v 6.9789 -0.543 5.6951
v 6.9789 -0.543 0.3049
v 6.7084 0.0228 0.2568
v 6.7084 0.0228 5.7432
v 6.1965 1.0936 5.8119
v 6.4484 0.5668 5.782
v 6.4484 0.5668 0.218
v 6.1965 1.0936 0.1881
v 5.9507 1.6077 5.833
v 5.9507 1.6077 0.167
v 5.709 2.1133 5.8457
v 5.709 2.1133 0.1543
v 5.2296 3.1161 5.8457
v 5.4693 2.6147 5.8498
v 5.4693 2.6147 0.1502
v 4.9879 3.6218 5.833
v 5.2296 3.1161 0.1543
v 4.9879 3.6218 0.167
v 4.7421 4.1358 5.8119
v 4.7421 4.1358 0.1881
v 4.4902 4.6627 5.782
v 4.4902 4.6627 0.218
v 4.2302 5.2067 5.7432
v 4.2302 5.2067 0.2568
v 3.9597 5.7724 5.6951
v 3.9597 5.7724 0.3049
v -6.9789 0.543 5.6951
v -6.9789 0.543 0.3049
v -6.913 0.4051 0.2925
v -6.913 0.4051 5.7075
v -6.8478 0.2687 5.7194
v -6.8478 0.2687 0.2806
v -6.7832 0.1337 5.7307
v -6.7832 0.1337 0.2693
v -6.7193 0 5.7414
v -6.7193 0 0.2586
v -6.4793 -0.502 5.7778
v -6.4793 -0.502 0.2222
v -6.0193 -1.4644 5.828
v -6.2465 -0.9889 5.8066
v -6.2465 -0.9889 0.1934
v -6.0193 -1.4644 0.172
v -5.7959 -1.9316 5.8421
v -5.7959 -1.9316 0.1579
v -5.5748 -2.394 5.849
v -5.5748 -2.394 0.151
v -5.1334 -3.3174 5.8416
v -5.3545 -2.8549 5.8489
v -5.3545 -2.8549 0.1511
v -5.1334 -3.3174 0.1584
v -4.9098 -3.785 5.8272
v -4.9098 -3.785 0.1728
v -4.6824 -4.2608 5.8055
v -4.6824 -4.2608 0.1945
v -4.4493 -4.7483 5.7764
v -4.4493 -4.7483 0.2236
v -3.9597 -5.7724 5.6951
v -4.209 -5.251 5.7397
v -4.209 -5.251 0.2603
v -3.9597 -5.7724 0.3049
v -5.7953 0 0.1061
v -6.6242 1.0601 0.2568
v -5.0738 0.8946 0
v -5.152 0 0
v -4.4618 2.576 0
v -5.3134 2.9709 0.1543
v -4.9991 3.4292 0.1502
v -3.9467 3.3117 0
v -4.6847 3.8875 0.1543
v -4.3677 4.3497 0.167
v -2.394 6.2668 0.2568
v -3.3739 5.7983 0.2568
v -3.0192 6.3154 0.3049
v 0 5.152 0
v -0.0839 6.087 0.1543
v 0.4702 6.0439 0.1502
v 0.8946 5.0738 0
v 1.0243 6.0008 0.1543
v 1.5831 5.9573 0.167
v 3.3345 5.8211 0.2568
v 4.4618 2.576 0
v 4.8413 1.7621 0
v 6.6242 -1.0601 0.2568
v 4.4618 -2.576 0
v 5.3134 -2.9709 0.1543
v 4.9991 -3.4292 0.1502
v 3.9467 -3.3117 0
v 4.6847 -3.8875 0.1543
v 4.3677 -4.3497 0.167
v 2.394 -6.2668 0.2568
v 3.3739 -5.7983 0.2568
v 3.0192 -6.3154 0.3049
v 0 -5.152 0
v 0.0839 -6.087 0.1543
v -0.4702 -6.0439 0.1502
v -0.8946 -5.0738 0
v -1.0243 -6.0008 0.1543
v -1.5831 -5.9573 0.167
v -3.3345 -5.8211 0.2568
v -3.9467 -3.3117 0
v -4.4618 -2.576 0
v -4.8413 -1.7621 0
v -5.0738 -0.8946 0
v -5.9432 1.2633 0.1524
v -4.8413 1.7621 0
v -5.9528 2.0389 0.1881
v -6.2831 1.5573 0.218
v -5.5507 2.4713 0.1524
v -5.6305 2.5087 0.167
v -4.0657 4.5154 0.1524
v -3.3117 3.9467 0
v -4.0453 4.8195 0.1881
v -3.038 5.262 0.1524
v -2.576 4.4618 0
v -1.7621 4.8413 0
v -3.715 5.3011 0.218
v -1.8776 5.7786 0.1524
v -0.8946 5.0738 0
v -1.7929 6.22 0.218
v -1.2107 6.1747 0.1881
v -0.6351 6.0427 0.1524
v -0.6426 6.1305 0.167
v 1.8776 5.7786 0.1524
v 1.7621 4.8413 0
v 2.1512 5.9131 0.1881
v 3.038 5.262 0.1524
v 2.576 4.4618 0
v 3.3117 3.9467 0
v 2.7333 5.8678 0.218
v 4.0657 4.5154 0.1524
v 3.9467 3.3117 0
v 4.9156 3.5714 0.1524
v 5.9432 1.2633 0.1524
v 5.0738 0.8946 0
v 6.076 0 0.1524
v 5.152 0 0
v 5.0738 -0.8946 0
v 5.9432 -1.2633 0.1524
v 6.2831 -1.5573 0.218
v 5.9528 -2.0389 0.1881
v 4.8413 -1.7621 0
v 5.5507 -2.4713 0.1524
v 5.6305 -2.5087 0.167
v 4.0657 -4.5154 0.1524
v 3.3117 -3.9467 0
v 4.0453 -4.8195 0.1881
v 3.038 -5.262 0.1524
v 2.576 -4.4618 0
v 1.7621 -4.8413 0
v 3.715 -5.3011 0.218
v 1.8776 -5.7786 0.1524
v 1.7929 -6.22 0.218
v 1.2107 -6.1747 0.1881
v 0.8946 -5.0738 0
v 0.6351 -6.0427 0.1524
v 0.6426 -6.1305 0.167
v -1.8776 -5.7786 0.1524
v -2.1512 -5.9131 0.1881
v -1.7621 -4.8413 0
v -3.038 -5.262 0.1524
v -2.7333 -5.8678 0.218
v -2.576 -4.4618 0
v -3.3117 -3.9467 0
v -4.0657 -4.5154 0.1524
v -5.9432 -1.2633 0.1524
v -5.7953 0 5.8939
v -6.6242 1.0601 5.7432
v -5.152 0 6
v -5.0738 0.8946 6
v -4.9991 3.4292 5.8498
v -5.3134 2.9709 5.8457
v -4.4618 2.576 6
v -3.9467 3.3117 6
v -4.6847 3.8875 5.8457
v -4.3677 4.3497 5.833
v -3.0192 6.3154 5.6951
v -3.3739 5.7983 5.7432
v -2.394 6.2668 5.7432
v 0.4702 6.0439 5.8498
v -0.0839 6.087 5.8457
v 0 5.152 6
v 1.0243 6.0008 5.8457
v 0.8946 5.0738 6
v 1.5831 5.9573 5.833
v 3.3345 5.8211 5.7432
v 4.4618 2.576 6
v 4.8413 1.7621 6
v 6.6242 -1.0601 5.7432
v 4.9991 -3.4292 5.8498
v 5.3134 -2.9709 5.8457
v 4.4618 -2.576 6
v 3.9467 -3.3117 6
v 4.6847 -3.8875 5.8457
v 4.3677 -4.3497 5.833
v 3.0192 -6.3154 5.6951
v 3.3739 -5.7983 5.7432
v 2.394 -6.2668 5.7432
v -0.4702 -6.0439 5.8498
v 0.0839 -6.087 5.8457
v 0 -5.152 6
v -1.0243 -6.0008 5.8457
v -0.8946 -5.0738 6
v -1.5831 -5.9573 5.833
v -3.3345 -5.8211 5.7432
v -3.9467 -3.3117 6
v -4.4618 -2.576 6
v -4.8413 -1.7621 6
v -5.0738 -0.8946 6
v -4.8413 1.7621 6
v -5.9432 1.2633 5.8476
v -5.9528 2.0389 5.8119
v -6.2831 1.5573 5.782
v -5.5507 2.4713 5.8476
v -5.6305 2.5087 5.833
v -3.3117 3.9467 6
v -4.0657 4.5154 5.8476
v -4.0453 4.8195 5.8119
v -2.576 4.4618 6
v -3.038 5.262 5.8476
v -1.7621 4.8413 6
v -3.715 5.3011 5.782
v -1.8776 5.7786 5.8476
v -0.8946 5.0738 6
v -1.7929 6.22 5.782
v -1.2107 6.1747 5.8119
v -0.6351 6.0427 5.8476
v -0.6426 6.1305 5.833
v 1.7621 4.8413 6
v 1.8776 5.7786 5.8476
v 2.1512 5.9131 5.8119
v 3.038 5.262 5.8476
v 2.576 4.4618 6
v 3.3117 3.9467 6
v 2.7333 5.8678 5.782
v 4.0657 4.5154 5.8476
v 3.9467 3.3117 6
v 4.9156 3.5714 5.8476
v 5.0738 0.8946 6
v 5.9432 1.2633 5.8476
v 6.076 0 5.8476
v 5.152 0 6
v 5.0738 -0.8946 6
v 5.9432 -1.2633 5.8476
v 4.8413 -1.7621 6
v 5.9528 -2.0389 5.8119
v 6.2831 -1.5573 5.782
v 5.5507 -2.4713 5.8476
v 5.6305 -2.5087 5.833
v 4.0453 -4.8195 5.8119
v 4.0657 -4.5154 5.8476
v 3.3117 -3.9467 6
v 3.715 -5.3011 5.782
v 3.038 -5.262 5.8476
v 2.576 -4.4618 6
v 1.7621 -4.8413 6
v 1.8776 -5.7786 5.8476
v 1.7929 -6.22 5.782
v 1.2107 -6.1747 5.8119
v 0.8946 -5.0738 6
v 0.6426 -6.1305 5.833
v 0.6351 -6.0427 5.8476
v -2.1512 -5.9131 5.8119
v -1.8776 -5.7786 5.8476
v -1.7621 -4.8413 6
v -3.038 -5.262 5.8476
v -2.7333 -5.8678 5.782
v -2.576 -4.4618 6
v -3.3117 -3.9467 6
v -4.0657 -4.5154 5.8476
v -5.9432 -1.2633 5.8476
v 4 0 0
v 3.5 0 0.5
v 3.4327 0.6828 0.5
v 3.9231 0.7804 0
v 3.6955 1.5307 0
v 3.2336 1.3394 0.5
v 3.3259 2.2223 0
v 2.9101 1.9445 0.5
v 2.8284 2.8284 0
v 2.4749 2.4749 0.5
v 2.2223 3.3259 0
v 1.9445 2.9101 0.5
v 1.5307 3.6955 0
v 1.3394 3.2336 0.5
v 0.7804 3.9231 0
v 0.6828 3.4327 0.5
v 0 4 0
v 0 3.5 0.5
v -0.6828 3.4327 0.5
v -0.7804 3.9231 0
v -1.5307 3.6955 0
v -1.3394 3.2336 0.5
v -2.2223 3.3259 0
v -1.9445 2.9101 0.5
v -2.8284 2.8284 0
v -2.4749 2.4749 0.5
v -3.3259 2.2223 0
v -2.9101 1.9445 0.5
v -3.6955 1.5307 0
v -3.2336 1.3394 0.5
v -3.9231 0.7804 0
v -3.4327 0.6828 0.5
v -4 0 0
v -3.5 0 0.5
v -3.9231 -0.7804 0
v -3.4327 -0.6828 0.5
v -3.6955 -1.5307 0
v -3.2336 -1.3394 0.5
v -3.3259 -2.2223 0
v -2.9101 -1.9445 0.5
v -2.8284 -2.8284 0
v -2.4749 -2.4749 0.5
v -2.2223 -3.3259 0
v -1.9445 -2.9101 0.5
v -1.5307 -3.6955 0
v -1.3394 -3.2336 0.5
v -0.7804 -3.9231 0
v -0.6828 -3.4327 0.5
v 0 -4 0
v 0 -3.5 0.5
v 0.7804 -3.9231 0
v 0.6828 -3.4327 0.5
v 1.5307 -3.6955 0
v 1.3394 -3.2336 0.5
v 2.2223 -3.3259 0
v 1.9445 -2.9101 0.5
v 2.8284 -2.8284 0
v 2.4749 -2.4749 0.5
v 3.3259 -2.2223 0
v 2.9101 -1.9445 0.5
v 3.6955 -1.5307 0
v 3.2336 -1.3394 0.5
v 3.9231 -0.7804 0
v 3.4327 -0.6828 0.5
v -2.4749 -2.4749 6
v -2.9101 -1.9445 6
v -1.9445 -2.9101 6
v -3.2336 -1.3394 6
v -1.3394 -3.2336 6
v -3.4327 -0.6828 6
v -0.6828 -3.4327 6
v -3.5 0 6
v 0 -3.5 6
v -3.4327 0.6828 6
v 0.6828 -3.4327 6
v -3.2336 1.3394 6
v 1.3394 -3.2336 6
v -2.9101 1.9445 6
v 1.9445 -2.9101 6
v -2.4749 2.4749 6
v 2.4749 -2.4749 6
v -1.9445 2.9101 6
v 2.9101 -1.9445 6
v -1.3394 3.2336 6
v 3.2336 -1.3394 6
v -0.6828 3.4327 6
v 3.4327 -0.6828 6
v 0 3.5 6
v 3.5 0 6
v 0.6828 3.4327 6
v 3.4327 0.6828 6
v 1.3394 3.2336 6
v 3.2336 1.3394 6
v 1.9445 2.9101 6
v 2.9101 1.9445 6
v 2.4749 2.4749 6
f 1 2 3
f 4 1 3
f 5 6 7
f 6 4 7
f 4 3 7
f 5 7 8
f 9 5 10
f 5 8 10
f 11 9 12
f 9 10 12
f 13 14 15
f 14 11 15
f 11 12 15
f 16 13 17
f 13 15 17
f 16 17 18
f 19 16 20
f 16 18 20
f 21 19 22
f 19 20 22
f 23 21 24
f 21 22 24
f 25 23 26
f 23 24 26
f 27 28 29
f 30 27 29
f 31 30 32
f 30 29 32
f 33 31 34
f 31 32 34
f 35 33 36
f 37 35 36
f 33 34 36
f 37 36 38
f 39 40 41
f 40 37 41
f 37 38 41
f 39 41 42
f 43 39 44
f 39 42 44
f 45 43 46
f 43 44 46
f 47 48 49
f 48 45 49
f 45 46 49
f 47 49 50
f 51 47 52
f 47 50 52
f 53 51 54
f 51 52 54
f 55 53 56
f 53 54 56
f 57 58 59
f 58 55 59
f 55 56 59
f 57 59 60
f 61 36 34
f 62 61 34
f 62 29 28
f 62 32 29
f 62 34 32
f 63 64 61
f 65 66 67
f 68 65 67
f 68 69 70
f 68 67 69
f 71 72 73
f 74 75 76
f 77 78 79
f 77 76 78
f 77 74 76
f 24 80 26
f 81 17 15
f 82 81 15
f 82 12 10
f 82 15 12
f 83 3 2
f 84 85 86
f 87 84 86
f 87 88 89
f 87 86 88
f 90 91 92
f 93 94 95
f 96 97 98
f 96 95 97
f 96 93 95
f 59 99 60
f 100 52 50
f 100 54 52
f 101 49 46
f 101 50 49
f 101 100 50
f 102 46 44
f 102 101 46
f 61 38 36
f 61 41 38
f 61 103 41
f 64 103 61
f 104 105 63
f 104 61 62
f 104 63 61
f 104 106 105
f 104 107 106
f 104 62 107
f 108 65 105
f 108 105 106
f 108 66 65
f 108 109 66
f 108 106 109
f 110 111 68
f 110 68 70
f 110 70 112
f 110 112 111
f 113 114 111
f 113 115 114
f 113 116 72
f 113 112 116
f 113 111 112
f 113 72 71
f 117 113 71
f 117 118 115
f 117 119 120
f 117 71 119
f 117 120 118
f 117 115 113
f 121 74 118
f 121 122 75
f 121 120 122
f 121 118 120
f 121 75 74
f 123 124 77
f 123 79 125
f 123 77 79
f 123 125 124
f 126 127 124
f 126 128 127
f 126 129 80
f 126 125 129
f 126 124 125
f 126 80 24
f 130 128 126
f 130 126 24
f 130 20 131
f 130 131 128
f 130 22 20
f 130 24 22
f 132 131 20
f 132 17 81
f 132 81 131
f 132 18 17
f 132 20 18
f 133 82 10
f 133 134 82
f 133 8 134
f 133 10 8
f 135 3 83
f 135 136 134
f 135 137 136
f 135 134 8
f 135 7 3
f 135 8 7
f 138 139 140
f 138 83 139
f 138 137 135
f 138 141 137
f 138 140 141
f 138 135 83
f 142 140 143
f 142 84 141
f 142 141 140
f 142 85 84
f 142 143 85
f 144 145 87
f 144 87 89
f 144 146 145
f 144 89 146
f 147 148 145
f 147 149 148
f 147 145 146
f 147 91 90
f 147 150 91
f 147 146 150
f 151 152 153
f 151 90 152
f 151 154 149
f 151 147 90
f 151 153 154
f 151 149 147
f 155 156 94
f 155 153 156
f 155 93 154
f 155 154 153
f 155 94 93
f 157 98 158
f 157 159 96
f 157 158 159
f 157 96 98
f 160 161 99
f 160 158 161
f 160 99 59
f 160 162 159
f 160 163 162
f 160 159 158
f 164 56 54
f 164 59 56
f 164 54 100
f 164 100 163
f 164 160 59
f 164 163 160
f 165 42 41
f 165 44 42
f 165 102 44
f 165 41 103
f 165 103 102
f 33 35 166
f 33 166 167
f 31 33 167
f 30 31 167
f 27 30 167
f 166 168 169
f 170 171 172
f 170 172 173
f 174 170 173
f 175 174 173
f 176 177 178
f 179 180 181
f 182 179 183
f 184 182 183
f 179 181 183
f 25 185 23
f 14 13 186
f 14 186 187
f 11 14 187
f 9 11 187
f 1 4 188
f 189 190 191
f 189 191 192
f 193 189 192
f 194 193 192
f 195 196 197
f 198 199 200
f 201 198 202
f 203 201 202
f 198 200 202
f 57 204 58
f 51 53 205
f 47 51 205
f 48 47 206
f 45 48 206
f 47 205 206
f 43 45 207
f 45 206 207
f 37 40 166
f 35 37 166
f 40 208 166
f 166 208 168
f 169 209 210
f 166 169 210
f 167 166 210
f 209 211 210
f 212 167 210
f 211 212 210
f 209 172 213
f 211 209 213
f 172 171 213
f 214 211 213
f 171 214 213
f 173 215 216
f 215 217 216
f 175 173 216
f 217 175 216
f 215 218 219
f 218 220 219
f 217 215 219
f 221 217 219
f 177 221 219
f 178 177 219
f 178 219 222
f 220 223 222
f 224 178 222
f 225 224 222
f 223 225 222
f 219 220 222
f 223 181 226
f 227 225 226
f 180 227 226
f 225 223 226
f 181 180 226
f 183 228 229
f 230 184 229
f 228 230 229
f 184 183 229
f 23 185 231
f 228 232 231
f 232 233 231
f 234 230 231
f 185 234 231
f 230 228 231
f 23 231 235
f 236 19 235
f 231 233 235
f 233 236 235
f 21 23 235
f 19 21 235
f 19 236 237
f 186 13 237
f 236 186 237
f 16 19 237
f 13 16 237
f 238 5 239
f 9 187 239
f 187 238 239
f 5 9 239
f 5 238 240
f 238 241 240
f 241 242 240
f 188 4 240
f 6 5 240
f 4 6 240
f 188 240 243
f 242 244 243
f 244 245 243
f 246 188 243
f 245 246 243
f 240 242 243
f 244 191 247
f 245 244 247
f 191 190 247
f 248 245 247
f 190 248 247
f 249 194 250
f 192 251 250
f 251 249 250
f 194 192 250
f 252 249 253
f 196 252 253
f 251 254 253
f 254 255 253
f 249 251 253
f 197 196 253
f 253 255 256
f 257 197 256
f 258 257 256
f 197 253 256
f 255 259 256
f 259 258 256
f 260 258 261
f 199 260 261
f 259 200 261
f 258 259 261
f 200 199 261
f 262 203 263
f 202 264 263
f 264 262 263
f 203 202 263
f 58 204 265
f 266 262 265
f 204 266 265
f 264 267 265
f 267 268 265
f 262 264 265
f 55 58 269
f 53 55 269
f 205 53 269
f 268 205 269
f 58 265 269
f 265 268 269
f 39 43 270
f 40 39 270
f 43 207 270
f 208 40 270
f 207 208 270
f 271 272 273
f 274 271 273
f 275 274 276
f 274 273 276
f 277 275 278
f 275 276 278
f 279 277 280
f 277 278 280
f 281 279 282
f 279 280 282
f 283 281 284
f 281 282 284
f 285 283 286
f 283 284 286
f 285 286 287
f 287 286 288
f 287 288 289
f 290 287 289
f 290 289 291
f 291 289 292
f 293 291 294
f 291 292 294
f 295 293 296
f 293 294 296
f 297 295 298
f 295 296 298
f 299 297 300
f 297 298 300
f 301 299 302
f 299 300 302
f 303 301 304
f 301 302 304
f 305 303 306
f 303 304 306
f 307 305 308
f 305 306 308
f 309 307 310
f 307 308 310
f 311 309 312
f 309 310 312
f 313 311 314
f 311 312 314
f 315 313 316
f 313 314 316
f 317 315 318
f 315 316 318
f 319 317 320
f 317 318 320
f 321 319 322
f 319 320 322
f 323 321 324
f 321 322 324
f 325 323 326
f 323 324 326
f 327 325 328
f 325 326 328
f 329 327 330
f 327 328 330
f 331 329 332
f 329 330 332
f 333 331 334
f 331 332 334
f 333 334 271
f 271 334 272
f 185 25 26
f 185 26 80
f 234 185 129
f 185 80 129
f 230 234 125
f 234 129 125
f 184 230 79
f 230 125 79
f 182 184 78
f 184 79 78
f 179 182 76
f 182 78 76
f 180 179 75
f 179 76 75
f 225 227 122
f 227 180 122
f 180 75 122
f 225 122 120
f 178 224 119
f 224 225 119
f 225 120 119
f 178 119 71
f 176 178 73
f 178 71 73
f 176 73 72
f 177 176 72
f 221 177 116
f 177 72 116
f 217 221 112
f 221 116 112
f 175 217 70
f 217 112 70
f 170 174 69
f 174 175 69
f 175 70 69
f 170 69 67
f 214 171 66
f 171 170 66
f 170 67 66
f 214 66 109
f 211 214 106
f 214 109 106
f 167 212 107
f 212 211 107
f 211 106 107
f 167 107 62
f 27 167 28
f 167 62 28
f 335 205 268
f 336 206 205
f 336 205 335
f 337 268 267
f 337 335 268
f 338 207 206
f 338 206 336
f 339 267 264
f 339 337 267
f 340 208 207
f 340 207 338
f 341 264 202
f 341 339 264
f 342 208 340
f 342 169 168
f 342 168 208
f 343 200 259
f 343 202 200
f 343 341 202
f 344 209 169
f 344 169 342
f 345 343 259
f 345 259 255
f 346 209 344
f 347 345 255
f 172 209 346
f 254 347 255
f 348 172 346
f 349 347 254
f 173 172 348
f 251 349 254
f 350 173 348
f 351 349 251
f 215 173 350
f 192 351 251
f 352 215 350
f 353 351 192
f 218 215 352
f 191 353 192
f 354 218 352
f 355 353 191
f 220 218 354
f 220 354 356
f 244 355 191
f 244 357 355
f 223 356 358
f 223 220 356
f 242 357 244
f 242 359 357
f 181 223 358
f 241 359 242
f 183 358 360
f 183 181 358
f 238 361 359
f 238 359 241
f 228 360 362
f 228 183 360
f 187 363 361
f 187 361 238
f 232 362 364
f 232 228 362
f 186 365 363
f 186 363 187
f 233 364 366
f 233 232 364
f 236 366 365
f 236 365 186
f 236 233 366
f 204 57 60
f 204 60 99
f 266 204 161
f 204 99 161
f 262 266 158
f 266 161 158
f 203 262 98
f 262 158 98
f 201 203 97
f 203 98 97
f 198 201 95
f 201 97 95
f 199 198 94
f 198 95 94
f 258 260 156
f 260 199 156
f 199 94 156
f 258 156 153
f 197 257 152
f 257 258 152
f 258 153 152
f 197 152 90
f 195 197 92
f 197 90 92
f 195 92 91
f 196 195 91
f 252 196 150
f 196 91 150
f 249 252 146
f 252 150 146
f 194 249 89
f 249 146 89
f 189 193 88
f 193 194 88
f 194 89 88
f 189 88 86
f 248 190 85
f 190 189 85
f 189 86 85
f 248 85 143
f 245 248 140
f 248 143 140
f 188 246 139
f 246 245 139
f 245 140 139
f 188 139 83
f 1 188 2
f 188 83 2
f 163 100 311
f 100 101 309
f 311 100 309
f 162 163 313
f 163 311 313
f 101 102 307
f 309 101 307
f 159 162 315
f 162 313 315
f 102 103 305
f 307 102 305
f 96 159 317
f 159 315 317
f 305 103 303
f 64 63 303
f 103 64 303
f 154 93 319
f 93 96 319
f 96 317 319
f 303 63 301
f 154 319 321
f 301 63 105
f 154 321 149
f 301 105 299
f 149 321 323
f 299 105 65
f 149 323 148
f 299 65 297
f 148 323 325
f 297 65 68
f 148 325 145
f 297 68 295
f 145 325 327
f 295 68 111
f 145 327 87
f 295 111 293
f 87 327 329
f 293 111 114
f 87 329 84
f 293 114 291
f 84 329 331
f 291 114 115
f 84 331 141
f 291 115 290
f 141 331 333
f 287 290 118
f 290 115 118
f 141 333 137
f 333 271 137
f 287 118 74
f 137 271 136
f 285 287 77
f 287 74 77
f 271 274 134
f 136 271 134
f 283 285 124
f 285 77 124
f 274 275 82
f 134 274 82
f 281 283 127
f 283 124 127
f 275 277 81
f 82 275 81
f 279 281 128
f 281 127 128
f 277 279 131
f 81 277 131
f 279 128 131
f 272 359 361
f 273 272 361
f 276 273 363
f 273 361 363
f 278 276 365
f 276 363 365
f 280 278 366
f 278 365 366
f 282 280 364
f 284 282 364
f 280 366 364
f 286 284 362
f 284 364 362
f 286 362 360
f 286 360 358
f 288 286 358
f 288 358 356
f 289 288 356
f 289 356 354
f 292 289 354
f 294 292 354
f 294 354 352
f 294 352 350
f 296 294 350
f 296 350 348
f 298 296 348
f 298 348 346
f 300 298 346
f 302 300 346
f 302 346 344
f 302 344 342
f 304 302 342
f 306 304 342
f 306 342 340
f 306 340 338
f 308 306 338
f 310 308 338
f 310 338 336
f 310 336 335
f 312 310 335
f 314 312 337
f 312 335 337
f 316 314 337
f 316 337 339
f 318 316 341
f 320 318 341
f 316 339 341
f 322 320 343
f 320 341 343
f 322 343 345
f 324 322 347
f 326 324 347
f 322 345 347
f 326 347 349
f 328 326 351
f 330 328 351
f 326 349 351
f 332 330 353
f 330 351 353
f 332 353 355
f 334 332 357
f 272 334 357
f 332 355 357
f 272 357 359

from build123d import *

# Parameters (mm, degrees)
EXTRUDE_1_DEPTH     = 6
SKETCH_5_R          = 3.5
CUT_EXTRUDE_2_DEPTH = 7
CHAMFER_1_SIZE      = 0.5


with BuildPart() as part:
    # Эскиз1 → Вытянуть1 (new body)
    with BuildSketch(Plane.XY):
        Polygon((-3.019213701, 6.315405658), (-6.978908586, 0.542987065), (-3.959694885, -5.772418593), (3.019213701, -6.315405658), (6.978908586, -0.542987065), (3.959694885, 5.772418593), align=None)
    extrude(amount=EXTRUDE_1_DEPTH)

    # Вырез-По траектории1: sweep along a path in Эскиз3
    with BuildLine(Plane(origin=(0, 0, 0), x_dir=(-1, 0, 0), z_dir=(0, 0, -1))) as sweep_1_path:
        CenterArc((0, 0), 4.80754516, 0, 360)
    # Эскиз4 → Вырез-По траектории1 (sweep, cut)
    with BuildSketch(Plane(origin=(0, 0, 0), x_dir=(1, 0, 0), z_dir=(0, 1, 0))):
        Polygon((-5.152045548, 0), (-8.017144415, -0.472678529), (-8.017144415, 0.689853389), align=None)
    sweep_1 = sweep(path=sweep_1_path.line, mode=Mode.SUBTRACT)

    # Зеркальное отражение1: Вырез-По траектории1 across plane
    add(sweep_1.mirror(Plane(origin=(0, 0, 3), x_dir=(1, 0, 0), z_dir=(0, 0, -1))), mode=Mode.SUBTRACT)

    # Эскиз5 → Вытянуть2 (cut, through all)
    with BuildSketch(Plane.XY.offset(6)):
        Circle(SKETCH_5_R)
    extrude(amount=-CUT_EXTRUDE_2_DEPTH, mode=Mode.SUBTRACT)

    # Фаска1
    chamfer_1_edges = [part.edges().sort_by_distance(p)[0] for p in [
        (-3.5, 0, 0),
    ]]
    chamfer(chamfer_1_edges, length=CHAMFER_1_SIZE)


solid = part.part
